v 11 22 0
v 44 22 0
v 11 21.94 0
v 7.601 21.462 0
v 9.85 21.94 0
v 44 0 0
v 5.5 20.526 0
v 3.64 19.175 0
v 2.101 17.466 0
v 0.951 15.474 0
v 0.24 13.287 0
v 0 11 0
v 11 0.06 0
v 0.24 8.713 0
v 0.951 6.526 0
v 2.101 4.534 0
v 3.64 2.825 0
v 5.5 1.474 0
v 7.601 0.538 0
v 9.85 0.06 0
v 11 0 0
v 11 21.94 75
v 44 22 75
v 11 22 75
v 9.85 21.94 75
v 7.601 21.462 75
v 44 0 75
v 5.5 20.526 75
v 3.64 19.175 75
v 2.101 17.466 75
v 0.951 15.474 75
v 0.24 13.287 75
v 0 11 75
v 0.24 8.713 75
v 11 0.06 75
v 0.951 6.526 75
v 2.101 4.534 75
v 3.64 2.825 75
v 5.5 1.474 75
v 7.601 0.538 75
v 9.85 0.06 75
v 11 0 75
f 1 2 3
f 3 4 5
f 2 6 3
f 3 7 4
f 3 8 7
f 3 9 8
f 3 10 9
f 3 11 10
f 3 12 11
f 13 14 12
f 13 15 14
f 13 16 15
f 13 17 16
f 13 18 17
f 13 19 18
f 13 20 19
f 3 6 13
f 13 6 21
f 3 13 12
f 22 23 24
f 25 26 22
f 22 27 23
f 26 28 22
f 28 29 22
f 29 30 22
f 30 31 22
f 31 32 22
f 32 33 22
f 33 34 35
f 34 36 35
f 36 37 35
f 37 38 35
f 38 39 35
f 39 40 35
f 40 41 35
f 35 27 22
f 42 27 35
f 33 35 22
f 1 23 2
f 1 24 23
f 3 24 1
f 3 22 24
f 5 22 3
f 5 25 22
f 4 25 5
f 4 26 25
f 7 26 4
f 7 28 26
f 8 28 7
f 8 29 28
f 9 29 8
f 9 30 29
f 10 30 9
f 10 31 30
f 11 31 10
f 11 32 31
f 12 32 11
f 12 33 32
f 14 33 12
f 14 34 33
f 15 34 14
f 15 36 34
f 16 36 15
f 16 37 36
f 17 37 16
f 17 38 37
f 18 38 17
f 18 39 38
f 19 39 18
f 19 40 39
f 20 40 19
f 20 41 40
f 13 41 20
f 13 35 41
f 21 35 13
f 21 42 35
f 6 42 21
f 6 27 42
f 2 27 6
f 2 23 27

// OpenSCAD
module flatstuff()
{
translate([11,0,0])square([33,22]);
translate([11,11,0]) circle(11);
}
linear_extrude(height = 75) flatstuff();
